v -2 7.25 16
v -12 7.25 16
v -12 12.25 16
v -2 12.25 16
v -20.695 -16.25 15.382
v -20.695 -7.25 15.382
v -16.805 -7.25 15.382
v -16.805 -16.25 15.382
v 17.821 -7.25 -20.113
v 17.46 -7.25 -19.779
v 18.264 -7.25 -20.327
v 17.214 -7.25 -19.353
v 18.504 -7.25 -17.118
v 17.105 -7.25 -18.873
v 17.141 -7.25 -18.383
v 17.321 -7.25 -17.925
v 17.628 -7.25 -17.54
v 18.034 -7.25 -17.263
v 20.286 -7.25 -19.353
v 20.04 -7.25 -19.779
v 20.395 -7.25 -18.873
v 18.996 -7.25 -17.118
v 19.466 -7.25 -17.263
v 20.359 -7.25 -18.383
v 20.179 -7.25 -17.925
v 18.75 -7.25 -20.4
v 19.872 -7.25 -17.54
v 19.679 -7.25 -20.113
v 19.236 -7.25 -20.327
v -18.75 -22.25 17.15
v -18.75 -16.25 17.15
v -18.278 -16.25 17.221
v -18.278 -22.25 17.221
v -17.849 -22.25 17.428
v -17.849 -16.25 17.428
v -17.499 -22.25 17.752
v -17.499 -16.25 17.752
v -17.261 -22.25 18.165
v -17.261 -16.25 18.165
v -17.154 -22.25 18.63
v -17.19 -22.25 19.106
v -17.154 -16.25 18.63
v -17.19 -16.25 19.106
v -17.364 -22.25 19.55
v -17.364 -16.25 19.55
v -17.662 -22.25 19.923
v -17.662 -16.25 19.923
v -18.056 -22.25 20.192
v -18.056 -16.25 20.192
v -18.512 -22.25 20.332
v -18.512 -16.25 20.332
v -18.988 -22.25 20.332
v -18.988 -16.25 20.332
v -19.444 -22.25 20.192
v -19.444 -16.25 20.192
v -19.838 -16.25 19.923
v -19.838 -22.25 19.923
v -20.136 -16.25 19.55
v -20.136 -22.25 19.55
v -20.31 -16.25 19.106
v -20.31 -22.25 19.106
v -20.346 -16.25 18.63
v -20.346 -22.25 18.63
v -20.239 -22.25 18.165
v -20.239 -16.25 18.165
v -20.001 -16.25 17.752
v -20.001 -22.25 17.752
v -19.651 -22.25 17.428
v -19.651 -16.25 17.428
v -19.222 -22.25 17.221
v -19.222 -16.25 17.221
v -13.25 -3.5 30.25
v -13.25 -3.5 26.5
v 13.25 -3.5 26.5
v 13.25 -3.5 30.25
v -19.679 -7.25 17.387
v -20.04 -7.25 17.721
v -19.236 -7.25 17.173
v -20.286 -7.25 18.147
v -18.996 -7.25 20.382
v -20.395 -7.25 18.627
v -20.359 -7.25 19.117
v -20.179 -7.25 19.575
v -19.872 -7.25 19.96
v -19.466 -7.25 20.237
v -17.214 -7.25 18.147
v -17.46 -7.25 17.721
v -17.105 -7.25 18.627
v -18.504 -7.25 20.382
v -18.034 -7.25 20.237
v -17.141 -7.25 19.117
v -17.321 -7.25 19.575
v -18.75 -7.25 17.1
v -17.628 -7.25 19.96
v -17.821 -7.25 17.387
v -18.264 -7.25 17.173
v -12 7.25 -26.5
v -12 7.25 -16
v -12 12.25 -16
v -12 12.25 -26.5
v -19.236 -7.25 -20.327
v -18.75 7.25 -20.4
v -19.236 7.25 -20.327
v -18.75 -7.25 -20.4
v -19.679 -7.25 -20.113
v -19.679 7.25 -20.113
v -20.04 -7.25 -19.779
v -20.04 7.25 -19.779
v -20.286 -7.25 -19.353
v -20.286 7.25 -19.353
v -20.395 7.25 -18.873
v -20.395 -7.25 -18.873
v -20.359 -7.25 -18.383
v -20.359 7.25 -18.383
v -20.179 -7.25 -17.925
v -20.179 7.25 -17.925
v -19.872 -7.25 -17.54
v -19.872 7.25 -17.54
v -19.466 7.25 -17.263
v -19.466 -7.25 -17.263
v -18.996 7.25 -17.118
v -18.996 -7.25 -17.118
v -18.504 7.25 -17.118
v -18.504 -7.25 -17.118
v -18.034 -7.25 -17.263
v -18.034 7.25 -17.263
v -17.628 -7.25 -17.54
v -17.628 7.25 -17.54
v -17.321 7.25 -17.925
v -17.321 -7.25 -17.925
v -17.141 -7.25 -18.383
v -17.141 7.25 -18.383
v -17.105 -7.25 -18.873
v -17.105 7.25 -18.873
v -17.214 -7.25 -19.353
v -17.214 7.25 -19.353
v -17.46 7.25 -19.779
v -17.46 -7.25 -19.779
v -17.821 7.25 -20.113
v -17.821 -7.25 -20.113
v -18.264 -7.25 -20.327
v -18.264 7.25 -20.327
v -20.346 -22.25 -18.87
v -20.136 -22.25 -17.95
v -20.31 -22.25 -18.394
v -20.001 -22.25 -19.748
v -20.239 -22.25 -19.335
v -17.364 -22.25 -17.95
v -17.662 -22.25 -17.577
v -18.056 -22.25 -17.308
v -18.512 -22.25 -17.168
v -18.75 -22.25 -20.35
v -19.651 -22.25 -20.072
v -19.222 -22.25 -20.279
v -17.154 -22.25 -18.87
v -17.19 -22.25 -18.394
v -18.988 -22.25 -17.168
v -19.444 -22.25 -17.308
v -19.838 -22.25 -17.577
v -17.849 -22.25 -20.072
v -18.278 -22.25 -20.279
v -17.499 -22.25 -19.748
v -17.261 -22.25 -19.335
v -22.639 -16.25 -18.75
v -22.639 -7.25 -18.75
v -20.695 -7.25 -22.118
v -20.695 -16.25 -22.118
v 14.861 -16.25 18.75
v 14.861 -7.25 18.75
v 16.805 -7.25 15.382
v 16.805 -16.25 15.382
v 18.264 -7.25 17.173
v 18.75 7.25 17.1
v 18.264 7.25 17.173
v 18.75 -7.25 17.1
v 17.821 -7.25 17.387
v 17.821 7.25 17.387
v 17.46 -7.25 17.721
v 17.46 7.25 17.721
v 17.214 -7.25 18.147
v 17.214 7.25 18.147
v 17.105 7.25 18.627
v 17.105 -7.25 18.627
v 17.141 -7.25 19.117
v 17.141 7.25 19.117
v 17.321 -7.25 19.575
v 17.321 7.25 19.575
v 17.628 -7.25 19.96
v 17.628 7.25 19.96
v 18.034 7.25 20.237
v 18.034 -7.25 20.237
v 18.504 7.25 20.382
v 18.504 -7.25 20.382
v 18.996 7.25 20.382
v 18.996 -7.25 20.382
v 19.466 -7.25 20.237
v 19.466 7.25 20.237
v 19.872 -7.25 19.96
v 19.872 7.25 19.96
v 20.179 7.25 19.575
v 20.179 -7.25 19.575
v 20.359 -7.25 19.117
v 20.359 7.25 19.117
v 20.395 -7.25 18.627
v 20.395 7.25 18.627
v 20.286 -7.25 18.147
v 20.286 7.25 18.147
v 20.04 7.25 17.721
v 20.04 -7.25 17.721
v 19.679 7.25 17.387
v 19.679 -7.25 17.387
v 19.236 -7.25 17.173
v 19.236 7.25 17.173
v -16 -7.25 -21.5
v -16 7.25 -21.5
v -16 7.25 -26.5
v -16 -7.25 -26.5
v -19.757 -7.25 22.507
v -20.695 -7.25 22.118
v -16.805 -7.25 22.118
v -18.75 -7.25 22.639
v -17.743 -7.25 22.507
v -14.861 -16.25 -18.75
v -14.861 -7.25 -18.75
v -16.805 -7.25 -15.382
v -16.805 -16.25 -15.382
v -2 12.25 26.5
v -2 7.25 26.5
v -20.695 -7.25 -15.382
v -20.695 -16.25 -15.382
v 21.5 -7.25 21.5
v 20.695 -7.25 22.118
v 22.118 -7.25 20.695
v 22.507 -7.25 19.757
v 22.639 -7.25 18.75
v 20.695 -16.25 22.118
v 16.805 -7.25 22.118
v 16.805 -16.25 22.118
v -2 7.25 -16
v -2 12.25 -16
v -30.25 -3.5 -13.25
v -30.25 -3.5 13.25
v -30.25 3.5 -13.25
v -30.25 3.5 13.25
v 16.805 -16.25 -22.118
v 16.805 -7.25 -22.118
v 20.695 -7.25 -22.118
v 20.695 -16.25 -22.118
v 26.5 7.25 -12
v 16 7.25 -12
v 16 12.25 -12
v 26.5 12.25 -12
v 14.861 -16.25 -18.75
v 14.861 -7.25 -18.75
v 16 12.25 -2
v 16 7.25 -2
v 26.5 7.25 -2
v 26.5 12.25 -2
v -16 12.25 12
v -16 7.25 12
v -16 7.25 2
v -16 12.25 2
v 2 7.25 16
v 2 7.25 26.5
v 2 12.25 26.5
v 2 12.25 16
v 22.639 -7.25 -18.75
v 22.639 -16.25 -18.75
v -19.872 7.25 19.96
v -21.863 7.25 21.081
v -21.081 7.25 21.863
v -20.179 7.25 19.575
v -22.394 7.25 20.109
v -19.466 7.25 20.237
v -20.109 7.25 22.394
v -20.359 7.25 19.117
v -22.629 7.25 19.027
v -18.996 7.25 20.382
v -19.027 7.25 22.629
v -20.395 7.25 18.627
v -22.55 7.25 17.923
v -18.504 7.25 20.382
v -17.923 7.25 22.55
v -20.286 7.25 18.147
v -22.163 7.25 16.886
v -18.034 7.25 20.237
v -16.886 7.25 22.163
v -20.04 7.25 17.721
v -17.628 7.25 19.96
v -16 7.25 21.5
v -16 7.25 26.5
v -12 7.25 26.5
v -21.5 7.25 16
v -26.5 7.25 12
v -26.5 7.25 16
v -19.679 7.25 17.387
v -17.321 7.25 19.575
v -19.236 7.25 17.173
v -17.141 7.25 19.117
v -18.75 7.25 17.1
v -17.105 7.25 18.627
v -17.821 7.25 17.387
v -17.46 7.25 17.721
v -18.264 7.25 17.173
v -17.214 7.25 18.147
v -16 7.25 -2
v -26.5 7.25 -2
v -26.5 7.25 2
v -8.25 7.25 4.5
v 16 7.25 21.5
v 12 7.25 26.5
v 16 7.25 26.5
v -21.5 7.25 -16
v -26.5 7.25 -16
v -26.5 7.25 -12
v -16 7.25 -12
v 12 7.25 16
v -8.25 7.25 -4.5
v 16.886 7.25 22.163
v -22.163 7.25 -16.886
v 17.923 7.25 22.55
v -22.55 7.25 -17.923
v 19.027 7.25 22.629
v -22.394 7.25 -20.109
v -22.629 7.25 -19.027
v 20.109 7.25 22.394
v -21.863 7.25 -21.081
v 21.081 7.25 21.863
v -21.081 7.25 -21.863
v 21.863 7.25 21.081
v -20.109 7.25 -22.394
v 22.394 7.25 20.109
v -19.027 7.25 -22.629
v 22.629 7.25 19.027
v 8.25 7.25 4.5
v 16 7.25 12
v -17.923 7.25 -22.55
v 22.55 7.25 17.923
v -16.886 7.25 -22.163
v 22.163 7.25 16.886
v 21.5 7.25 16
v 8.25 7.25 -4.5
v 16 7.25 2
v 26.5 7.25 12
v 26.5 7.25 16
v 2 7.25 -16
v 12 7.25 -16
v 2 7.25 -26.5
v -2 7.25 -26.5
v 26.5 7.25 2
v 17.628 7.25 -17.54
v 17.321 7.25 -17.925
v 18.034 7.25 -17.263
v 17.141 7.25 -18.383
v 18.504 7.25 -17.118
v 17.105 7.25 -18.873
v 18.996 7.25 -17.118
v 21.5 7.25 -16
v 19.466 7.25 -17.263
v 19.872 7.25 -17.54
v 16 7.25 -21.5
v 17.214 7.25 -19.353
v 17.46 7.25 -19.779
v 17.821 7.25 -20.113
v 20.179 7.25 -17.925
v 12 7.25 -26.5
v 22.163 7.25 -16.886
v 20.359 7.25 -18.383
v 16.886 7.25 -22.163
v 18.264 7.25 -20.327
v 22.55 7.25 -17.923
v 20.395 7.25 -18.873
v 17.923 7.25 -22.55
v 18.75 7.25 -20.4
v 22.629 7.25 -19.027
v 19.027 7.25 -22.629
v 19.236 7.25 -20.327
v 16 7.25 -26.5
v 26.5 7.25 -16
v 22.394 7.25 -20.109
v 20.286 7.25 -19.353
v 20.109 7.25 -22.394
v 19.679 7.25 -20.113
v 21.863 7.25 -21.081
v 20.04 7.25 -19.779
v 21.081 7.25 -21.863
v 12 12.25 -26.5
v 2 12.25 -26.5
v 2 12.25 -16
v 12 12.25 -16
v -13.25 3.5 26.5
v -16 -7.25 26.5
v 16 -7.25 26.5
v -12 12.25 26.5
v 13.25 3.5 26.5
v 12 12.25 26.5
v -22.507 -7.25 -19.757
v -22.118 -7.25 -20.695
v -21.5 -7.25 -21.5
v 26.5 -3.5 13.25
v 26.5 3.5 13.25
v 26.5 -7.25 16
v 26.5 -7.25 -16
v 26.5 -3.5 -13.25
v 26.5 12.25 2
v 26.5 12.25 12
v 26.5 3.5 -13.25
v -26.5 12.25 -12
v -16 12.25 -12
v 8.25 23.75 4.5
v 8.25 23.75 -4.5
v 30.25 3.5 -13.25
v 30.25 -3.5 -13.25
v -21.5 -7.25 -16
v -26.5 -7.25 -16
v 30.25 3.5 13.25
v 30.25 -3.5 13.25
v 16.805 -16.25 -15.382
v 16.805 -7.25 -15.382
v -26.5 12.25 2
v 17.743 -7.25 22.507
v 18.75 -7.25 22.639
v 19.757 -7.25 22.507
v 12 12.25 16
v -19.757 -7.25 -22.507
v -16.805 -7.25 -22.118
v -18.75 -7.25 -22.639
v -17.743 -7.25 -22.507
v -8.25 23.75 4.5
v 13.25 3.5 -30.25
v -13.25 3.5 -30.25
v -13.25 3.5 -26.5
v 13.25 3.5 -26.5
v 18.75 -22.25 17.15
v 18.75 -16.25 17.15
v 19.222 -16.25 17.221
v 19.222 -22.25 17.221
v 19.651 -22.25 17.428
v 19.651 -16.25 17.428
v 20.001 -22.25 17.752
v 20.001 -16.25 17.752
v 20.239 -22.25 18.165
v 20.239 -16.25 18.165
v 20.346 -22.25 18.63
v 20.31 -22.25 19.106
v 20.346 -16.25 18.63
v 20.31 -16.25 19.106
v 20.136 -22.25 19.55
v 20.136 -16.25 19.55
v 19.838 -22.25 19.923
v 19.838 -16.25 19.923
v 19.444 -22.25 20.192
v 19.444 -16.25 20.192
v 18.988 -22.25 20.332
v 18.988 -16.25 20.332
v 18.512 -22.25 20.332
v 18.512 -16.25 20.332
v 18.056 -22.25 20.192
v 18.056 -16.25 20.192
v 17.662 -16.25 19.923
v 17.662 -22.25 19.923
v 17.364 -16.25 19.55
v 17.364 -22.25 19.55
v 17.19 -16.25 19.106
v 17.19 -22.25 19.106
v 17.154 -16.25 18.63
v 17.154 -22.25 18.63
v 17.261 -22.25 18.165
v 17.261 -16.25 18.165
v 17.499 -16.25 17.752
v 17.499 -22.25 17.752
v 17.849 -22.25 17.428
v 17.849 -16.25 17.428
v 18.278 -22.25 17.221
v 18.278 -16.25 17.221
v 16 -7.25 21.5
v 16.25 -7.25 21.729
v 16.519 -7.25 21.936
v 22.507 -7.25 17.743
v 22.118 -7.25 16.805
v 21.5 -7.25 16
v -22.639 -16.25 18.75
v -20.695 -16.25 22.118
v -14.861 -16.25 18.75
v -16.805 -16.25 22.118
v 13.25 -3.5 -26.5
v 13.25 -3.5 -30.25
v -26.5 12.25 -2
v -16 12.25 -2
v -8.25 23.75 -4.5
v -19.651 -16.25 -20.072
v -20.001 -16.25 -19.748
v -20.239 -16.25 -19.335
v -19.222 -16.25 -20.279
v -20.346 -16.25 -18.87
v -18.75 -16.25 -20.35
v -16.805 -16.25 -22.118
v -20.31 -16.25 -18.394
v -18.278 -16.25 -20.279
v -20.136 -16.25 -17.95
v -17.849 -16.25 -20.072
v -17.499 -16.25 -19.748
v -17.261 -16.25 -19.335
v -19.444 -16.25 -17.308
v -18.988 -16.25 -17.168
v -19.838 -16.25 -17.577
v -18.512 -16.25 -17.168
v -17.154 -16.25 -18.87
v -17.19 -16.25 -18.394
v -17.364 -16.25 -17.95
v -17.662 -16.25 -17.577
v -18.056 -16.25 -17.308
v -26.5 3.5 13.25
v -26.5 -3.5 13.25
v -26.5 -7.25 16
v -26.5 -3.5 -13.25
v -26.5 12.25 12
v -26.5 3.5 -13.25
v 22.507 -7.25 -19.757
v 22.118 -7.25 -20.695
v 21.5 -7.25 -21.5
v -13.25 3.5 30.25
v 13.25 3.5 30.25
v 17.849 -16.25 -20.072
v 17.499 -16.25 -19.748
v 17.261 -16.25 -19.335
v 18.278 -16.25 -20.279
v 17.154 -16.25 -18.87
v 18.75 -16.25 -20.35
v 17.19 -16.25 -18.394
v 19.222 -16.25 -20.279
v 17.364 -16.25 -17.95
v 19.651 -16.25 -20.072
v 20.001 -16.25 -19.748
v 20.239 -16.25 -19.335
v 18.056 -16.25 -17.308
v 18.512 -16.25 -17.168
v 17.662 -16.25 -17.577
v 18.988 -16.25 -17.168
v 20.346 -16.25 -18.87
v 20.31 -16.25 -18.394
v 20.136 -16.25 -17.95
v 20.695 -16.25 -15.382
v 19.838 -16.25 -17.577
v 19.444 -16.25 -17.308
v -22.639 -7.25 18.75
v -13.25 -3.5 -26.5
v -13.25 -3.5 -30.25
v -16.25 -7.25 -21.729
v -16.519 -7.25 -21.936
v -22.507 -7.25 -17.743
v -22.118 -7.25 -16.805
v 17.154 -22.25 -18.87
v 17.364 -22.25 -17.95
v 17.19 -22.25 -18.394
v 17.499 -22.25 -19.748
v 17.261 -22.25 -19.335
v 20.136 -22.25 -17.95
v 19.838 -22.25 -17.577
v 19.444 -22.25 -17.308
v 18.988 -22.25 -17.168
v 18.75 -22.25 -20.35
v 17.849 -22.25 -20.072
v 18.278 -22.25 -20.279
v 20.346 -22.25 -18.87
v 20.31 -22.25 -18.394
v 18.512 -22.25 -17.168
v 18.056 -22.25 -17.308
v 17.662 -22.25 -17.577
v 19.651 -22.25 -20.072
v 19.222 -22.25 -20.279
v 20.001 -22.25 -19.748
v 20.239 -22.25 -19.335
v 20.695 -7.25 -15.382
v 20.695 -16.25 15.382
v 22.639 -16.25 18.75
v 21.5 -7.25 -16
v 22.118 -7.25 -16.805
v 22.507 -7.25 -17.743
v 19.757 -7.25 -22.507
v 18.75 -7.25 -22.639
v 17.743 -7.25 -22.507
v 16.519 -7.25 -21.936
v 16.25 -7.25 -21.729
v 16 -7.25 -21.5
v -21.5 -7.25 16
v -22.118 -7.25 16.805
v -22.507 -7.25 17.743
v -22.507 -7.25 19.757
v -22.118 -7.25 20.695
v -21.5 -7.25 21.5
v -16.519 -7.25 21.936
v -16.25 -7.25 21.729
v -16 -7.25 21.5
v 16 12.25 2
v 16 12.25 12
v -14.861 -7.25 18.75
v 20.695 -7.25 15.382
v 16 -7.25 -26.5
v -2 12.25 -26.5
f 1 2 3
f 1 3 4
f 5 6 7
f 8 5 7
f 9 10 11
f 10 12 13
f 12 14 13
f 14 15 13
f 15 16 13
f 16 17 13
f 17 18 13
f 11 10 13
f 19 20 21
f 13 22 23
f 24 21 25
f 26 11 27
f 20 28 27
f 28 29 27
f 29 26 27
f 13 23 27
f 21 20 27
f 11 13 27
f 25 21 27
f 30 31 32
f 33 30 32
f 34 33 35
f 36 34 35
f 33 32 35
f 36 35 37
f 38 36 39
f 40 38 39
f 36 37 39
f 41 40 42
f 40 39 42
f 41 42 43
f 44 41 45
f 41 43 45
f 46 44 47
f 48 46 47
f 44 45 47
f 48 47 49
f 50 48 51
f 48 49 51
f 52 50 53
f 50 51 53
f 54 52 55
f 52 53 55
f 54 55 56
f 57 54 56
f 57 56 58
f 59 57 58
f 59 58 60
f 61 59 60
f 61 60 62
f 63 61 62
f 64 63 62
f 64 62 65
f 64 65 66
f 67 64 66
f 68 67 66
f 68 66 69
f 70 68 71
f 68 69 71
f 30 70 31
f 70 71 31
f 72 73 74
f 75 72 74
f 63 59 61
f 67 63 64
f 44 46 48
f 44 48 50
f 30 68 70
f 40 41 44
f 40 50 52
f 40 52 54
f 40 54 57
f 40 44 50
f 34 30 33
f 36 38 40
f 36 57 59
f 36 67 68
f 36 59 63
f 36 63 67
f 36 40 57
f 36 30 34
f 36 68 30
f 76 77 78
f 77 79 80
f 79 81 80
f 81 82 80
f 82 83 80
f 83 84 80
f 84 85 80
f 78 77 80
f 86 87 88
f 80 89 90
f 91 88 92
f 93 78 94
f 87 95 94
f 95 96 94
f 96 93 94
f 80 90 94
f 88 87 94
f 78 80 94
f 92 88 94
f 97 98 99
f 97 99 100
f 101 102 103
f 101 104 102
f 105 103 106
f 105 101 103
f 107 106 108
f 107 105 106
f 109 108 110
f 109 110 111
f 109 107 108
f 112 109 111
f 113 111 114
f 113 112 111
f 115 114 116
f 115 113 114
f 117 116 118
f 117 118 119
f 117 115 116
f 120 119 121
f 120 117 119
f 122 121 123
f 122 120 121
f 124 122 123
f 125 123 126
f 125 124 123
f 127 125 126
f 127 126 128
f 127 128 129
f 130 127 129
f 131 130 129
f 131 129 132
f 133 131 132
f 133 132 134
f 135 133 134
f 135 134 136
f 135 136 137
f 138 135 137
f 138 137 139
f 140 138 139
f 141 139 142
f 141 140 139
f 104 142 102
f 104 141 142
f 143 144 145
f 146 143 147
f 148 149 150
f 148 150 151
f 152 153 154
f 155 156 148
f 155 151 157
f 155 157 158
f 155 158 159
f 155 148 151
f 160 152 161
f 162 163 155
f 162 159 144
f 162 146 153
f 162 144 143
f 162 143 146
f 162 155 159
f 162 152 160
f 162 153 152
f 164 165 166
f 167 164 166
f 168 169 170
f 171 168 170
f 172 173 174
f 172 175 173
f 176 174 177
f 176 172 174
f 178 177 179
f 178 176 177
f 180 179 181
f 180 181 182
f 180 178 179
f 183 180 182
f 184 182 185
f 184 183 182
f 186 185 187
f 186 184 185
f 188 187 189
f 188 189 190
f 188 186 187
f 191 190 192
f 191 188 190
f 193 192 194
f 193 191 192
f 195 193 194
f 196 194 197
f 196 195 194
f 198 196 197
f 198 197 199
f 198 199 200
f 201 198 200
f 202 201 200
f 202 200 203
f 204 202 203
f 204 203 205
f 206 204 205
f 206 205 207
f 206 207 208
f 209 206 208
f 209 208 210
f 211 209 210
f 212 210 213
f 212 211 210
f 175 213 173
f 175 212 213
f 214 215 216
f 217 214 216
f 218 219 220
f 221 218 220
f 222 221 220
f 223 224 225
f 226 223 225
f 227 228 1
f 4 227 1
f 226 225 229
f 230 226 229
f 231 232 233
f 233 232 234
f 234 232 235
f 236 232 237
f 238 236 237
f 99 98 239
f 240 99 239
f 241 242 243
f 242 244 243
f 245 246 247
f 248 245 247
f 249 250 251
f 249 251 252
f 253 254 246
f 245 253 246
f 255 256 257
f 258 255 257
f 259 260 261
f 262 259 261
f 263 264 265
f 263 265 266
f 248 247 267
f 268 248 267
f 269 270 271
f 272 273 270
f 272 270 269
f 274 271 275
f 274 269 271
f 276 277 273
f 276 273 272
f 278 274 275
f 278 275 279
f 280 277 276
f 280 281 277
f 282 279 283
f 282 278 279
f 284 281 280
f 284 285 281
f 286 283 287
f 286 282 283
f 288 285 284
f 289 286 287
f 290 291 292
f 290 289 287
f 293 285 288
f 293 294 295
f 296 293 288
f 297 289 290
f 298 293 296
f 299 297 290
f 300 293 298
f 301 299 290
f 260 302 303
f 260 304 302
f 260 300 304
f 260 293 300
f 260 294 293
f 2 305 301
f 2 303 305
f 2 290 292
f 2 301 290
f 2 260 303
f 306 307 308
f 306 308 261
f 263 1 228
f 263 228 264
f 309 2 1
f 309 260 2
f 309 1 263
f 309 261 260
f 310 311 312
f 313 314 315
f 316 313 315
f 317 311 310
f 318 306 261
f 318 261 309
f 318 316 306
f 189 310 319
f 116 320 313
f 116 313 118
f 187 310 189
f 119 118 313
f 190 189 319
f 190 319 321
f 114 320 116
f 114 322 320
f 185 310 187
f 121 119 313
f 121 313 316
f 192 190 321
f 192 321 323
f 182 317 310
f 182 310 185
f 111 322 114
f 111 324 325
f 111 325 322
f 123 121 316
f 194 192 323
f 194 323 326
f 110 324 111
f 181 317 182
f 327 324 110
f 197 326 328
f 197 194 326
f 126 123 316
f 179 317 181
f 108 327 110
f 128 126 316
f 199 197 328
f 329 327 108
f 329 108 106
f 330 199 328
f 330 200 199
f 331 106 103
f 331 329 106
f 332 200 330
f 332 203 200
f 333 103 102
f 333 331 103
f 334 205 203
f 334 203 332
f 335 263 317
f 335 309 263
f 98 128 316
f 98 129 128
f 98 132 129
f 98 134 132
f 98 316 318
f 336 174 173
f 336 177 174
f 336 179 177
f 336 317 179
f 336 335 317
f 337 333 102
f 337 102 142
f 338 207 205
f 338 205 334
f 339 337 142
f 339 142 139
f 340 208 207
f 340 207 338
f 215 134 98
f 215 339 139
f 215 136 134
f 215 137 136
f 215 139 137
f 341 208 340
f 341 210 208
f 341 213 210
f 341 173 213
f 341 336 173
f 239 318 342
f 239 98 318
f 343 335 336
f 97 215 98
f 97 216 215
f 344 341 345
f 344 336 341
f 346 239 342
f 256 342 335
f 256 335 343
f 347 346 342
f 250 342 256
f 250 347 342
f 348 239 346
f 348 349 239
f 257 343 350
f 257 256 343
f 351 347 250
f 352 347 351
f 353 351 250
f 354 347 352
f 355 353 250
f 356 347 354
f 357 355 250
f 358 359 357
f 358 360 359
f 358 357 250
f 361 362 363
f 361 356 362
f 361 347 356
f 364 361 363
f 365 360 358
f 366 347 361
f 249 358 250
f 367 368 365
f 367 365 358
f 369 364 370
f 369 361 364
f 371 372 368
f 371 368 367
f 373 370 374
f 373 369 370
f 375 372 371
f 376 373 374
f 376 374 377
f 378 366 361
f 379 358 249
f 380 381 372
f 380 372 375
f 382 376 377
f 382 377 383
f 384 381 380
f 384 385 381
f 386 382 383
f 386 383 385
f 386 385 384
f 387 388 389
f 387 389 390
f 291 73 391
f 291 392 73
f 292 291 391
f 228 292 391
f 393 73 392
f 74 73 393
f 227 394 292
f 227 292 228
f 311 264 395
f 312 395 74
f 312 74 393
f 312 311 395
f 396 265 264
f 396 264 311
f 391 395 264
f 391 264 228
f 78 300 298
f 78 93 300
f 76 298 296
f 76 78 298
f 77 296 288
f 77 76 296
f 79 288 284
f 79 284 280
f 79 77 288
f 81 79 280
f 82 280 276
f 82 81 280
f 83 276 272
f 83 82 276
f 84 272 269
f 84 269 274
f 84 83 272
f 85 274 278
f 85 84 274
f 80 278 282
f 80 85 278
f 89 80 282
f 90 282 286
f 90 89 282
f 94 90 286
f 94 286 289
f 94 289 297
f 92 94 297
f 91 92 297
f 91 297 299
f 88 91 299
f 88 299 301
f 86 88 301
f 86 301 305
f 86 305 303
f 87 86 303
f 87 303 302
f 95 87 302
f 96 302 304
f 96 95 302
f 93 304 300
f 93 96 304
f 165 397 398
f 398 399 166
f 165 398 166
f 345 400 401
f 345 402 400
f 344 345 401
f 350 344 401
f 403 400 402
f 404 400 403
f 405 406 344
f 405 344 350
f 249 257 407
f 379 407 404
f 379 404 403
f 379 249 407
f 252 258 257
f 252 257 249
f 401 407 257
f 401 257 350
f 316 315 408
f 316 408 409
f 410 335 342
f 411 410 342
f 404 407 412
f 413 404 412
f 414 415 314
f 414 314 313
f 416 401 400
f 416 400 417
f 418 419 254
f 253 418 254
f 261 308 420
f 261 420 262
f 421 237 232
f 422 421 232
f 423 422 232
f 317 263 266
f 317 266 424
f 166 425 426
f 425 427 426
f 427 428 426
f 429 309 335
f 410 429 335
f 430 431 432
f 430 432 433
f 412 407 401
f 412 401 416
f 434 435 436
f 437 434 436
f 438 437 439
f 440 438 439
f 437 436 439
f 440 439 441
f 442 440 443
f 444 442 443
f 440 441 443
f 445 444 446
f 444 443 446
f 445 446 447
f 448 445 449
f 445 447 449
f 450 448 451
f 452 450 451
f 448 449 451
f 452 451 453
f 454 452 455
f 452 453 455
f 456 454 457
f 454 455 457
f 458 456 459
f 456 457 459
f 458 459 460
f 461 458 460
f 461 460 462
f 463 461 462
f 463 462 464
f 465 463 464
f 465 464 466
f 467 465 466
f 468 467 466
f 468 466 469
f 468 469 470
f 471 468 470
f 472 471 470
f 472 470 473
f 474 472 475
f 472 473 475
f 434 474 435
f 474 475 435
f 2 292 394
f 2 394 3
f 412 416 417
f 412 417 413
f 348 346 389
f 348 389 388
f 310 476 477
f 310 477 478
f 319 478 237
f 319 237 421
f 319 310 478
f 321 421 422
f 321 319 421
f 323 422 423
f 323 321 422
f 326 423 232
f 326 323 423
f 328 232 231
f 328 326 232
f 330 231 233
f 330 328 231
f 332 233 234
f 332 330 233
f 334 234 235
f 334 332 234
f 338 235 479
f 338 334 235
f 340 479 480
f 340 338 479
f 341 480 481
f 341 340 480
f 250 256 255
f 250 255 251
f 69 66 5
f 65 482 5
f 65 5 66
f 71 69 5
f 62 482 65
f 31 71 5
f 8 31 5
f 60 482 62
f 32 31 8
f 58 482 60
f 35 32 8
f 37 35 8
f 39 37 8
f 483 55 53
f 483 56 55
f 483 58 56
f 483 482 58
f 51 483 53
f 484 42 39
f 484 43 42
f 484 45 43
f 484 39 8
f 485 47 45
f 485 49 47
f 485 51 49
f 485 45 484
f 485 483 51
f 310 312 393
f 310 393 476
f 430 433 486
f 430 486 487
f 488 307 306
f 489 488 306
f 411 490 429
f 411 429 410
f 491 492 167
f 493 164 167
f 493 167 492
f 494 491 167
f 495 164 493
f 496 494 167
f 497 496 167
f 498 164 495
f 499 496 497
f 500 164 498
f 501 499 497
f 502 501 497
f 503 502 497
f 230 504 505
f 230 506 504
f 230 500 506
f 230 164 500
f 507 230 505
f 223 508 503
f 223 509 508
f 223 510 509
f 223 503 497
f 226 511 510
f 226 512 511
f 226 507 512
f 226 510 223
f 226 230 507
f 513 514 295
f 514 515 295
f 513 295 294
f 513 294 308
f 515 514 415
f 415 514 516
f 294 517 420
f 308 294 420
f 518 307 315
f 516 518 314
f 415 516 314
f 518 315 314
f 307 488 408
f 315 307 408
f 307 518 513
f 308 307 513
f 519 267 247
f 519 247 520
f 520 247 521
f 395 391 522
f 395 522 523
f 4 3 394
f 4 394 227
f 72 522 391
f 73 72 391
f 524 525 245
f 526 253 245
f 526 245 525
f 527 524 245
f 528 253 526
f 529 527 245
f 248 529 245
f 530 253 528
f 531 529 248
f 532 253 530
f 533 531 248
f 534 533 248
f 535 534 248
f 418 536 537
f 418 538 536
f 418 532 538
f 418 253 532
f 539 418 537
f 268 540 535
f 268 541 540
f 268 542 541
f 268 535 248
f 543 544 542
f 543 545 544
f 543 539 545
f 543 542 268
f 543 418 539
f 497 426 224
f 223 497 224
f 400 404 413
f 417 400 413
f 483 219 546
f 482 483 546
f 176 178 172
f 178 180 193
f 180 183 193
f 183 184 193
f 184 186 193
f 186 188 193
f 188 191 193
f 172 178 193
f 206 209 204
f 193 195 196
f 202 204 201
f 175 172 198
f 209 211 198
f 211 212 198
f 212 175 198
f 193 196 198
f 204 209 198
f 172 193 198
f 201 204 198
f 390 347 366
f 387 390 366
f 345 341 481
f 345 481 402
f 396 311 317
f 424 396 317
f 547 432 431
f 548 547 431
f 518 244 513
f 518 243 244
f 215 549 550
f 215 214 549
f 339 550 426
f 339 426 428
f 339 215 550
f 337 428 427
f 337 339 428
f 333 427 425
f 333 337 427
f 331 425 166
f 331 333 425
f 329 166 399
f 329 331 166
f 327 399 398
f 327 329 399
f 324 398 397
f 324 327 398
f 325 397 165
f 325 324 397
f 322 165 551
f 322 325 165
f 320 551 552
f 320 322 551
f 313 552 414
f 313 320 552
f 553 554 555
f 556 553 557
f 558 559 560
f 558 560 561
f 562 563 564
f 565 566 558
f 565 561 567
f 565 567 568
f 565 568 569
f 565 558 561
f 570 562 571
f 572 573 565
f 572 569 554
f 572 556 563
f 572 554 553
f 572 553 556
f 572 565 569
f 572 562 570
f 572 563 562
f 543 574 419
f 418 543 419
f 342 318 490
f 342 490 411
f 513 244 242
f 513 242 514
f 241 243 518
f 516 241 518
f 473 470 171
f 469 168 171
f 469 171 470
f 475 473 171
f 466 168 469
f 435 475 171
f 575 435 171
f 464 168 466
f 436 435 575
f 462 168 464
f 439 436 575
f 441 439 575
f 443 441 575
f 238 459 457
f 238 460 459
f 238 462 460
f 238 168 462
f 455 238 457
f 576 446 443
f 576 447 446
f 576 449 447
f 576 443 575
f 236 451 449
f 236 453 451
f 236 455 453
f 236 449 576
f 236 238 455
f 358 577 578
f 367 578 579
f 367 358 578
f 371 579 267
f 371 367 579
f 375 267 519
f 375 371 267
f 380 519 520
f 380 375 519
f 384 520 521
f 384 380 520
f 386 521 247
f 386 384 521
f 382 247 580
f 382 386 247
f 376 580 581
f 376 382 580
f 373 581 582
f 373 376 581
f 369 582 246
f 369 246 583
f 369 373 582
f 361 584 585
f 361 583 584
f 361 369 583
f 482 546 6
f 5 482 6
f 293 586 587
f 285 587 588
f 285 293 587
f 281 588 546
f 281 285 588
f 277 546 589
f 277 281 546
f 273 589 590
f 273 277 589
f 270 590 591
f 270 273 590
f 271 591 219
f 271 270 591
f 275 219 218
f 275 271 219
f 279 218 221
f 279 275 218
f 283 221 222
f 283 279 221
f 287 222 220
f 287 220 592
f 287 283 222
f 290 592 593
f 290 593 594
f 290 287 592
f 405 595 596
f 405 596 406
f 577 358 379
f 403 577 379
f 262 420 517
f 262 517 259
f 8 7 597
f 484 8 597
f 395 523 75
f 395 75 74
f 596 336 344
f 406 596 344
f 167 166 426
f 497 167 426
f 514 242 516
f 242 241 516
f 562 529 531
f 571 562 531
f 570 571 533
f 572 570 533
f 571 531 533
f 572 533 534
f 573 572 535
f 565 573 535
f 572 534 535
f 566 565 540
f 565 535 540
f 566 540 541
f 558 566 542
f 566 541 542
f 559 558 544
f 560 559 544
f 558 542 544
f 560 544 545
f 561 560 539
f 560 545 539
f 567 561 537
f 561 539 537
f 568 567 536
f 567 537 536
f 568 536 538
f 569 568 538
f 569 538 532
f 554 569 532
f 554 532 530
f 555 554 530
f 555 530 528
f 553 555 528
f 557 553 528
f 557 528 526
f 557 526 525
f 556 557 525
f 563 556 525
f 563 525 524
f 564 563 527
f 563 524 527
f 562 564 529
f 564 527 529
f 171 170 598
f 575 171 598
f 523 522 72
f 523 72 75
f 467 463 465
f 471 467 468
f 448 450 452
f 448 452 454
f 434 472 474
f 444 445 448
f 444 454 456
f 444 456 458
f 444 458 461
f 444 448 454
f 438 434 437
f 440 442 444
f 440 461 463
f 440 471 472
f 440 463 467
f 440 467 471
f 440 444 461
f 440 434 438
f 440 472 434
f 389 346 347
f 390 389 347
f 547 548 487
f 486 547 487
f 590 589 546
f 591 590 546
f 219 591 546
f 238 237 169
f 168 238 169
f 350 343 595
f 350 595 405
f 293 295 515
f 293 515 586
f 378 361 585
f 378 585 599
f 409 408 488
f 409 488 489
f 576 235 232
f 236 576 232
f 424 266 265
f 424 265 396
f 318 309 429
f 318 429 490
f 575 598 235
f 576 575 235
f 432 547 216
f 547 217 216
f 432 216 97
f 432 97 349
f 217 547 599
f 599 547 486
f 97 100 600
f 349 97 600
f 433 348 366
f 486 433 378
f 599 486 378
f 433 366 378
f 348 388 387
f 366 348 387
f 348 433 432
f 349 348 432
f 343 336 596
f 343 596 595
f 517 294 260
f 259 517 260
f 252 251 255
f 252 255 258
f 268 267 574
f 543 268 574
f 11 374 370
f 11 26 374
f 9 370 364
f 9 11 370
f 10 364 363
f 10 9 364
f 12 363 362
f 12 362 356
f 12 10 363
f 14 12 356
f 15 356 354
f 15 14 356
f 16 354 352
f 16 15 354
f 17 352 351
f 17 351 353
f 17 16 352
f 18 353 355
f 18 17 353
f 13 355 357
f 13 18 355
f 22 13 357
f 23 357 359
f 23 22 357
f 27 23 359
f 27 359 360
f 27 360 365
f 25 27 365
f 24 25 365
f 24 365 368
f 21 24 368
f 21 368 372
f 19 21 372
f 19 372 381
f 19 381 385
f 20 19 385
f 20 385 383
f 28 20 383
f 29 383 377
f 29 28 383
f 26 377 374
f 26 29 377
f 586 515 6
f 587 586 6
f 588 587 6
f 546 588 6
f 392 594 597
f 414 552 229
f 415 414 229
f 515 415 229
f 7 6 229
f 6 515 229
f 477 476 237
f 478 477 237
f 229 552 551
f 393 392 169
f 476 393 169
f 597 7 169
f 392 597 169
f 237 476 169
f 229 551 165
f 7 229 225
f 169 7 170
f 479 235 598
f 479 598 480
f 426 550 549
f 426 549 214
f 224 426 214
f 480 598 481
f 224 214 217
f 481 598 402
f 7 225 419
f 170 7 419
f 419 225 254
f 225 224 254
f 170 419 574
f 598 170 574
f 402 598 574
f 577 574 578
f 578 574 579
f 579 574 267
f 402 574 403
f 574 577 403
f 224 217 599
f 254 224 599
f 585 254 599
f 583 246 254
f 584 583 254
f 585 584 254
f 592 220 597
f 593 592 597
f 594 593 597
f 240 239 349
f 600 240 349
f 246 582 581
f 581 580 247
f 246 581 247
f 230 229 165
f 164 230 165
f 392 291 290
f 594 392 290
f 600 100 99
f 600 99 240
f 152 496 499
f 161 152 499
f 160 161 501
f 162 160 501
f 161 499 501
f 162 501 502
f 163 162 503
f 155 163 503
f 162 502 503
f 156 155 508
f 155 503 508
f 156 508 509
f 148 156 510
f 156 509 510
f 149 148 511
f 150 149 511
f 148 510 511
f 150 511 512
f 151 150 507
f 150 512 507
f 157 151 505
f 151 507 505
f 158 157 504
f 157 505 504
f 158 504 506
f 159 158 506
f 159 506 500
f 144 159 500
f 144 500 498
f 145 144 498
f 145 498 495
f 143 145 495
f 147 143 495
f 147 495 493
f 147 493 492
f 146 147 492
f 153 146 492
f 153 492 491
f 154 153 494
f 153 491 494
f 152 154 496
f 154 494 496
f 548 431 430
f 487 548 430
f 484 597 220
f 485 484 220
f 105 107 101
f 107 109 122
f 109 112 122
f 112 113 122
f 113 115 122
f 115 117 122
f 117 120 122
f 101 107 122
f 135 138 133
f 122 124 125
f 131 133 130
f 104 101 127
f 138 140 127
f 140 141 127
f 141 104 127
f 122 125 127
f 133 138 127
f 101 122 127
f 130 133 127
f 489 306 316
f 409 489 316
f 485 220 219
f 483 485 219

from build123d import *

# Parameters (mm, degrees)
SKETCH_1_R        = 3.889087297
SKETCH_1_R_2      = 1.65
EXTRUDE_2_DEPTH   = 7.25
EXTRUDE_2_2_DEPTH = 7.25
EXTRUDE_2_3_DEPTH = 7.25
EXTRUDE_2_4_DEPTH = 7.25
SKETCH_2_W        = 32
SKETCH_2_H        = 53
SKETCH_2_W_2      = 53
SKETCH_2_H_2      = 32
EXTRUDE_3_DEPTH   = 7.25
SKETCH_3_W        = 26.5
SKETCH_3_H        = 60.5
SKETCH_3_W_2      = 60.5
SKETCH_3_H_2      = 26.5
EXTRUDE_4_DEPTH   = 3.5
SKETCH_4_W        = 16.5
SKETCH_4_H        = 9
EXTRUDE_5_DEPTH   = 16.5
SKETCH_5_W        = 10.5
SKETCH_5_H        = 10
SKETCH_5_W_2      = 10
SKETCH_5_H_2      = 10.5
EXTRUDE_6_DEPTH   = 5
EXTRUDE_7_DEPTH   = 9
SKETCH_7_R        = 1.6
EXTRUDE_8_DEPTH   = 6


with BuildPart() as part:
    # 草图1 → 凸台-拉伸2 (new, symmetric)
    with BuildSketch(Plane(origin=(0, 0, 0), x_dir=(1, 0, 0), z_dir=(0, 1, 0))):
        with Locations(Location((-18.75, 18.75, 0), (0, 0, 90))):
            Circle(SKETCH_1_R)
        with Locations(Location((-18.75, 18.75, 0), (0, 0, 90))):
            Circle(SKETCH_1_R_2, mode=Mode.SUBTRACT)
    extrude(amount=EXTRUDE_2_DEPTH, both=True)



with BuildPart() as body_2:
    # 草图1 → Extrude 2 2 (new, symmetric)
    with BuildSketch(Plane(origin=(0, 0, 0), x_dir=(1, 0, 0), z_dir=(0, 1, 0))):
        with Locations(Location((18.75, 18.75, 0), (0, 0, 90))):
            Circle(SKETCH_1_R)
        with Locations(Location((18.75, 18.75, 0), (0, 0, 90))):
            Circle(SKETCH_1_R_2, mode=Mode.SUBTRACT)
    extrude(amount=EXTRUDE_2_2_DEPTH, both=True)


with BuildPart() as body_3:
    # 草图1 → Extrude 2 3 (new, symmetric)
    with BuildSketch(Plane(origin=(0, 0, 0), x_dir=(1, 0, 0), z_dir=(0, 1, 0))):
        with Locations(Location((18.75, -18.75, 0), (0, 0, 90))):
            Circle(SKETCH_1_R)
        with Locations(Location((18.75, -18.75, 0), (0, 0, 90))):
            Circle(SKETCH_1_R_2, mode=Mode.SUBTRACT)
    extrude(amount=EXTRUDE_2_3_DEPTH, both=True)


with BuildPart() as body_4:
    # 草图1 → Extrude 2 4 (new, symmetric)
    with BuildSketch(Plane(origin=(0, 0, 0), x_dir=(1, 0, 0), z_dir=(0, 1, 0))):
        with Locations(Location((-18.75, -18.75, 0), (0, 0, 90))):
            Circle(SKETCH_1_R)
        with Locations(Location((-18.75, -18.75, 0), (0, 0, 90))):
            Circle(SKETCH_1_R_2, mode=Mode.SUBTRACT)
    extrude(amount=EXTRUDE_2_4_DEPTH, both=True)


with BuildPart() as part_1:
    add(part.part)

    add(body_2.part)  # 凸台-拉伸3 merges body 2

    add(body_3.part)  # 凸台-拉伸3 merges body 3

    add(body_4.part)  # 凸台-拉伸3 merges body 4
    # 草图2 → 凸台-拉伸3 (add, symmetric)
    with BuildSketch(Plane(origin=(0, 0, 0), x_dir=(1, 0, 0), z_dir=(0, 1, 0))):
        Rectangle(SKETCH_2_W, SKETCH_2_H)
        Rectangle(SKETCH_2_W_2, SKETCH_2_H_2)
    extrude(amount=EXTRUDE_3_DEPTH, both=True)

    # 草图3 → 凸台-拉伸4 (add, symmetric)
    with BuildSketch(Plane(origin=(0, 0, 0), x_dir=(1, 0, 0), z_dir=(0, 1, 0))):
        Rectangle(SKETCH_3_W, SKETCH_3_H)
        Rectangle(SKETCH_3_W_2, SKETCH_3_H_2)
    extrude(amount=EXTRUDE_4_DEPTH, both=True)

    # 草图4 → 凸台-拉伸5 (add)
    with BuildSketch(Plane(origin=(0, 7.25, 0), x_dir=(1, 0, 0), z_dir=(0, 1, 0))):
        Rectangle(SKETCH_4_W, SKETCH_4_H)
    extrude(amount=EXTRUDE_5_DEPTH)

    # 草图5 → 凸台-拉伸6 (add)
    with BuildSketch(Plane(origin=(0, 7.25, 0), x_dir=(1, 0, 0), z_dir=(0, 1, 0))):
        with Locations((-21.25, 7)):
            Rectangle(SKETCH_5_W, SKETCH_5_H)
        with Locations((-21.25, -7)):
            Rectangle(SKETCH_5_W, SKETCH_5_H)
        with Locations((7, 21.25)):
            Rectangle(SKETCH_5_W_2, SKETCH_5_H_2)
        with Locations((-7, 21.25)):
            Rectangle(SKETCH_5_W_2, SKETCH_5_H_2)
        with Locations((21.25, -7)):
            Rectangle(SKETCH_5_W, SKETCH_5_H)
        with Locations((21.25, 7)):
            Rectangle(SKETCH_5_W, SKETCH_5_H)
        with Locations((-7, -21.25)):
            Rectangle(SKETCH_5_W_2, SKETCH_5_H_2)
        with Locations((7, -21.25)):
            Rectangle(SKETCH_5_W_2, SKETCH_5_H_2)
    extrude(amount=EXTRUDE_6_DEPTH)

    # 草图6 → 凸台-拉伸7 (add)
    with BuildSketch(Plane.XZ.offset(7.25)):
        Polygon((-14.860912703, 18.75), (-16.805456352, 22.118048396), (-20.694543648, 22.118048396), (-22.639087297, 18.75), (-20.694543648, 15.381951604), (-16.805456352, 15.381951604), align=None)
        Polygon((22.639087297, 18.75), (20.694543648, 22.118048396), (16.805456352, 22.118048396), (14.860912703, 18.75), (16.805456352, 15.381951604), (20.694543648, 15.381951604), align=None)
        Polygon((22.639087297, -18.75), (20.694543648, -15.381951604), (16.805456352, -15.381951604), (14.860912703, -18.75), (16.805456352, -22.118048396), (20.694543648, -22.118048396), align=None)
        Polygon((-14.860912703, -18.75), (-16.805456352, -15.381951604), (-20.694543648, -15.381951604), (-22.639087297, -18.75), (-20.694543648, -22.118048396), (-16.805456352, -22.118048396), align=None)
    extrude(amount=EXTRUDE_7_DEPTH)

    # 草图7 → 凸台-拉伸8 (add)
    with BuildSketch(Plane.XZ.offset(16.25)):
        with Locations(Location((-18.75, 18.75, 0), (0, 0, 270))):
            Circle(SKETCH_7_R)
        with Locations(Location((18.75, 18.75, 0), (0, 0, 270))):
            Circle(SKETCH_7_R)
        with Locations(Location((18.75, -18.75, 0), (0, 0, 270))):
            Circle(SKETCH_7_R)
        with Locations(Location((-18.75, -18.75, 0), (0, 0, 270))):
            Circle(SKETCH_7_R)
    extrude(amount=EXTRUDE_8_DEPTH)


solid = part_1.part
